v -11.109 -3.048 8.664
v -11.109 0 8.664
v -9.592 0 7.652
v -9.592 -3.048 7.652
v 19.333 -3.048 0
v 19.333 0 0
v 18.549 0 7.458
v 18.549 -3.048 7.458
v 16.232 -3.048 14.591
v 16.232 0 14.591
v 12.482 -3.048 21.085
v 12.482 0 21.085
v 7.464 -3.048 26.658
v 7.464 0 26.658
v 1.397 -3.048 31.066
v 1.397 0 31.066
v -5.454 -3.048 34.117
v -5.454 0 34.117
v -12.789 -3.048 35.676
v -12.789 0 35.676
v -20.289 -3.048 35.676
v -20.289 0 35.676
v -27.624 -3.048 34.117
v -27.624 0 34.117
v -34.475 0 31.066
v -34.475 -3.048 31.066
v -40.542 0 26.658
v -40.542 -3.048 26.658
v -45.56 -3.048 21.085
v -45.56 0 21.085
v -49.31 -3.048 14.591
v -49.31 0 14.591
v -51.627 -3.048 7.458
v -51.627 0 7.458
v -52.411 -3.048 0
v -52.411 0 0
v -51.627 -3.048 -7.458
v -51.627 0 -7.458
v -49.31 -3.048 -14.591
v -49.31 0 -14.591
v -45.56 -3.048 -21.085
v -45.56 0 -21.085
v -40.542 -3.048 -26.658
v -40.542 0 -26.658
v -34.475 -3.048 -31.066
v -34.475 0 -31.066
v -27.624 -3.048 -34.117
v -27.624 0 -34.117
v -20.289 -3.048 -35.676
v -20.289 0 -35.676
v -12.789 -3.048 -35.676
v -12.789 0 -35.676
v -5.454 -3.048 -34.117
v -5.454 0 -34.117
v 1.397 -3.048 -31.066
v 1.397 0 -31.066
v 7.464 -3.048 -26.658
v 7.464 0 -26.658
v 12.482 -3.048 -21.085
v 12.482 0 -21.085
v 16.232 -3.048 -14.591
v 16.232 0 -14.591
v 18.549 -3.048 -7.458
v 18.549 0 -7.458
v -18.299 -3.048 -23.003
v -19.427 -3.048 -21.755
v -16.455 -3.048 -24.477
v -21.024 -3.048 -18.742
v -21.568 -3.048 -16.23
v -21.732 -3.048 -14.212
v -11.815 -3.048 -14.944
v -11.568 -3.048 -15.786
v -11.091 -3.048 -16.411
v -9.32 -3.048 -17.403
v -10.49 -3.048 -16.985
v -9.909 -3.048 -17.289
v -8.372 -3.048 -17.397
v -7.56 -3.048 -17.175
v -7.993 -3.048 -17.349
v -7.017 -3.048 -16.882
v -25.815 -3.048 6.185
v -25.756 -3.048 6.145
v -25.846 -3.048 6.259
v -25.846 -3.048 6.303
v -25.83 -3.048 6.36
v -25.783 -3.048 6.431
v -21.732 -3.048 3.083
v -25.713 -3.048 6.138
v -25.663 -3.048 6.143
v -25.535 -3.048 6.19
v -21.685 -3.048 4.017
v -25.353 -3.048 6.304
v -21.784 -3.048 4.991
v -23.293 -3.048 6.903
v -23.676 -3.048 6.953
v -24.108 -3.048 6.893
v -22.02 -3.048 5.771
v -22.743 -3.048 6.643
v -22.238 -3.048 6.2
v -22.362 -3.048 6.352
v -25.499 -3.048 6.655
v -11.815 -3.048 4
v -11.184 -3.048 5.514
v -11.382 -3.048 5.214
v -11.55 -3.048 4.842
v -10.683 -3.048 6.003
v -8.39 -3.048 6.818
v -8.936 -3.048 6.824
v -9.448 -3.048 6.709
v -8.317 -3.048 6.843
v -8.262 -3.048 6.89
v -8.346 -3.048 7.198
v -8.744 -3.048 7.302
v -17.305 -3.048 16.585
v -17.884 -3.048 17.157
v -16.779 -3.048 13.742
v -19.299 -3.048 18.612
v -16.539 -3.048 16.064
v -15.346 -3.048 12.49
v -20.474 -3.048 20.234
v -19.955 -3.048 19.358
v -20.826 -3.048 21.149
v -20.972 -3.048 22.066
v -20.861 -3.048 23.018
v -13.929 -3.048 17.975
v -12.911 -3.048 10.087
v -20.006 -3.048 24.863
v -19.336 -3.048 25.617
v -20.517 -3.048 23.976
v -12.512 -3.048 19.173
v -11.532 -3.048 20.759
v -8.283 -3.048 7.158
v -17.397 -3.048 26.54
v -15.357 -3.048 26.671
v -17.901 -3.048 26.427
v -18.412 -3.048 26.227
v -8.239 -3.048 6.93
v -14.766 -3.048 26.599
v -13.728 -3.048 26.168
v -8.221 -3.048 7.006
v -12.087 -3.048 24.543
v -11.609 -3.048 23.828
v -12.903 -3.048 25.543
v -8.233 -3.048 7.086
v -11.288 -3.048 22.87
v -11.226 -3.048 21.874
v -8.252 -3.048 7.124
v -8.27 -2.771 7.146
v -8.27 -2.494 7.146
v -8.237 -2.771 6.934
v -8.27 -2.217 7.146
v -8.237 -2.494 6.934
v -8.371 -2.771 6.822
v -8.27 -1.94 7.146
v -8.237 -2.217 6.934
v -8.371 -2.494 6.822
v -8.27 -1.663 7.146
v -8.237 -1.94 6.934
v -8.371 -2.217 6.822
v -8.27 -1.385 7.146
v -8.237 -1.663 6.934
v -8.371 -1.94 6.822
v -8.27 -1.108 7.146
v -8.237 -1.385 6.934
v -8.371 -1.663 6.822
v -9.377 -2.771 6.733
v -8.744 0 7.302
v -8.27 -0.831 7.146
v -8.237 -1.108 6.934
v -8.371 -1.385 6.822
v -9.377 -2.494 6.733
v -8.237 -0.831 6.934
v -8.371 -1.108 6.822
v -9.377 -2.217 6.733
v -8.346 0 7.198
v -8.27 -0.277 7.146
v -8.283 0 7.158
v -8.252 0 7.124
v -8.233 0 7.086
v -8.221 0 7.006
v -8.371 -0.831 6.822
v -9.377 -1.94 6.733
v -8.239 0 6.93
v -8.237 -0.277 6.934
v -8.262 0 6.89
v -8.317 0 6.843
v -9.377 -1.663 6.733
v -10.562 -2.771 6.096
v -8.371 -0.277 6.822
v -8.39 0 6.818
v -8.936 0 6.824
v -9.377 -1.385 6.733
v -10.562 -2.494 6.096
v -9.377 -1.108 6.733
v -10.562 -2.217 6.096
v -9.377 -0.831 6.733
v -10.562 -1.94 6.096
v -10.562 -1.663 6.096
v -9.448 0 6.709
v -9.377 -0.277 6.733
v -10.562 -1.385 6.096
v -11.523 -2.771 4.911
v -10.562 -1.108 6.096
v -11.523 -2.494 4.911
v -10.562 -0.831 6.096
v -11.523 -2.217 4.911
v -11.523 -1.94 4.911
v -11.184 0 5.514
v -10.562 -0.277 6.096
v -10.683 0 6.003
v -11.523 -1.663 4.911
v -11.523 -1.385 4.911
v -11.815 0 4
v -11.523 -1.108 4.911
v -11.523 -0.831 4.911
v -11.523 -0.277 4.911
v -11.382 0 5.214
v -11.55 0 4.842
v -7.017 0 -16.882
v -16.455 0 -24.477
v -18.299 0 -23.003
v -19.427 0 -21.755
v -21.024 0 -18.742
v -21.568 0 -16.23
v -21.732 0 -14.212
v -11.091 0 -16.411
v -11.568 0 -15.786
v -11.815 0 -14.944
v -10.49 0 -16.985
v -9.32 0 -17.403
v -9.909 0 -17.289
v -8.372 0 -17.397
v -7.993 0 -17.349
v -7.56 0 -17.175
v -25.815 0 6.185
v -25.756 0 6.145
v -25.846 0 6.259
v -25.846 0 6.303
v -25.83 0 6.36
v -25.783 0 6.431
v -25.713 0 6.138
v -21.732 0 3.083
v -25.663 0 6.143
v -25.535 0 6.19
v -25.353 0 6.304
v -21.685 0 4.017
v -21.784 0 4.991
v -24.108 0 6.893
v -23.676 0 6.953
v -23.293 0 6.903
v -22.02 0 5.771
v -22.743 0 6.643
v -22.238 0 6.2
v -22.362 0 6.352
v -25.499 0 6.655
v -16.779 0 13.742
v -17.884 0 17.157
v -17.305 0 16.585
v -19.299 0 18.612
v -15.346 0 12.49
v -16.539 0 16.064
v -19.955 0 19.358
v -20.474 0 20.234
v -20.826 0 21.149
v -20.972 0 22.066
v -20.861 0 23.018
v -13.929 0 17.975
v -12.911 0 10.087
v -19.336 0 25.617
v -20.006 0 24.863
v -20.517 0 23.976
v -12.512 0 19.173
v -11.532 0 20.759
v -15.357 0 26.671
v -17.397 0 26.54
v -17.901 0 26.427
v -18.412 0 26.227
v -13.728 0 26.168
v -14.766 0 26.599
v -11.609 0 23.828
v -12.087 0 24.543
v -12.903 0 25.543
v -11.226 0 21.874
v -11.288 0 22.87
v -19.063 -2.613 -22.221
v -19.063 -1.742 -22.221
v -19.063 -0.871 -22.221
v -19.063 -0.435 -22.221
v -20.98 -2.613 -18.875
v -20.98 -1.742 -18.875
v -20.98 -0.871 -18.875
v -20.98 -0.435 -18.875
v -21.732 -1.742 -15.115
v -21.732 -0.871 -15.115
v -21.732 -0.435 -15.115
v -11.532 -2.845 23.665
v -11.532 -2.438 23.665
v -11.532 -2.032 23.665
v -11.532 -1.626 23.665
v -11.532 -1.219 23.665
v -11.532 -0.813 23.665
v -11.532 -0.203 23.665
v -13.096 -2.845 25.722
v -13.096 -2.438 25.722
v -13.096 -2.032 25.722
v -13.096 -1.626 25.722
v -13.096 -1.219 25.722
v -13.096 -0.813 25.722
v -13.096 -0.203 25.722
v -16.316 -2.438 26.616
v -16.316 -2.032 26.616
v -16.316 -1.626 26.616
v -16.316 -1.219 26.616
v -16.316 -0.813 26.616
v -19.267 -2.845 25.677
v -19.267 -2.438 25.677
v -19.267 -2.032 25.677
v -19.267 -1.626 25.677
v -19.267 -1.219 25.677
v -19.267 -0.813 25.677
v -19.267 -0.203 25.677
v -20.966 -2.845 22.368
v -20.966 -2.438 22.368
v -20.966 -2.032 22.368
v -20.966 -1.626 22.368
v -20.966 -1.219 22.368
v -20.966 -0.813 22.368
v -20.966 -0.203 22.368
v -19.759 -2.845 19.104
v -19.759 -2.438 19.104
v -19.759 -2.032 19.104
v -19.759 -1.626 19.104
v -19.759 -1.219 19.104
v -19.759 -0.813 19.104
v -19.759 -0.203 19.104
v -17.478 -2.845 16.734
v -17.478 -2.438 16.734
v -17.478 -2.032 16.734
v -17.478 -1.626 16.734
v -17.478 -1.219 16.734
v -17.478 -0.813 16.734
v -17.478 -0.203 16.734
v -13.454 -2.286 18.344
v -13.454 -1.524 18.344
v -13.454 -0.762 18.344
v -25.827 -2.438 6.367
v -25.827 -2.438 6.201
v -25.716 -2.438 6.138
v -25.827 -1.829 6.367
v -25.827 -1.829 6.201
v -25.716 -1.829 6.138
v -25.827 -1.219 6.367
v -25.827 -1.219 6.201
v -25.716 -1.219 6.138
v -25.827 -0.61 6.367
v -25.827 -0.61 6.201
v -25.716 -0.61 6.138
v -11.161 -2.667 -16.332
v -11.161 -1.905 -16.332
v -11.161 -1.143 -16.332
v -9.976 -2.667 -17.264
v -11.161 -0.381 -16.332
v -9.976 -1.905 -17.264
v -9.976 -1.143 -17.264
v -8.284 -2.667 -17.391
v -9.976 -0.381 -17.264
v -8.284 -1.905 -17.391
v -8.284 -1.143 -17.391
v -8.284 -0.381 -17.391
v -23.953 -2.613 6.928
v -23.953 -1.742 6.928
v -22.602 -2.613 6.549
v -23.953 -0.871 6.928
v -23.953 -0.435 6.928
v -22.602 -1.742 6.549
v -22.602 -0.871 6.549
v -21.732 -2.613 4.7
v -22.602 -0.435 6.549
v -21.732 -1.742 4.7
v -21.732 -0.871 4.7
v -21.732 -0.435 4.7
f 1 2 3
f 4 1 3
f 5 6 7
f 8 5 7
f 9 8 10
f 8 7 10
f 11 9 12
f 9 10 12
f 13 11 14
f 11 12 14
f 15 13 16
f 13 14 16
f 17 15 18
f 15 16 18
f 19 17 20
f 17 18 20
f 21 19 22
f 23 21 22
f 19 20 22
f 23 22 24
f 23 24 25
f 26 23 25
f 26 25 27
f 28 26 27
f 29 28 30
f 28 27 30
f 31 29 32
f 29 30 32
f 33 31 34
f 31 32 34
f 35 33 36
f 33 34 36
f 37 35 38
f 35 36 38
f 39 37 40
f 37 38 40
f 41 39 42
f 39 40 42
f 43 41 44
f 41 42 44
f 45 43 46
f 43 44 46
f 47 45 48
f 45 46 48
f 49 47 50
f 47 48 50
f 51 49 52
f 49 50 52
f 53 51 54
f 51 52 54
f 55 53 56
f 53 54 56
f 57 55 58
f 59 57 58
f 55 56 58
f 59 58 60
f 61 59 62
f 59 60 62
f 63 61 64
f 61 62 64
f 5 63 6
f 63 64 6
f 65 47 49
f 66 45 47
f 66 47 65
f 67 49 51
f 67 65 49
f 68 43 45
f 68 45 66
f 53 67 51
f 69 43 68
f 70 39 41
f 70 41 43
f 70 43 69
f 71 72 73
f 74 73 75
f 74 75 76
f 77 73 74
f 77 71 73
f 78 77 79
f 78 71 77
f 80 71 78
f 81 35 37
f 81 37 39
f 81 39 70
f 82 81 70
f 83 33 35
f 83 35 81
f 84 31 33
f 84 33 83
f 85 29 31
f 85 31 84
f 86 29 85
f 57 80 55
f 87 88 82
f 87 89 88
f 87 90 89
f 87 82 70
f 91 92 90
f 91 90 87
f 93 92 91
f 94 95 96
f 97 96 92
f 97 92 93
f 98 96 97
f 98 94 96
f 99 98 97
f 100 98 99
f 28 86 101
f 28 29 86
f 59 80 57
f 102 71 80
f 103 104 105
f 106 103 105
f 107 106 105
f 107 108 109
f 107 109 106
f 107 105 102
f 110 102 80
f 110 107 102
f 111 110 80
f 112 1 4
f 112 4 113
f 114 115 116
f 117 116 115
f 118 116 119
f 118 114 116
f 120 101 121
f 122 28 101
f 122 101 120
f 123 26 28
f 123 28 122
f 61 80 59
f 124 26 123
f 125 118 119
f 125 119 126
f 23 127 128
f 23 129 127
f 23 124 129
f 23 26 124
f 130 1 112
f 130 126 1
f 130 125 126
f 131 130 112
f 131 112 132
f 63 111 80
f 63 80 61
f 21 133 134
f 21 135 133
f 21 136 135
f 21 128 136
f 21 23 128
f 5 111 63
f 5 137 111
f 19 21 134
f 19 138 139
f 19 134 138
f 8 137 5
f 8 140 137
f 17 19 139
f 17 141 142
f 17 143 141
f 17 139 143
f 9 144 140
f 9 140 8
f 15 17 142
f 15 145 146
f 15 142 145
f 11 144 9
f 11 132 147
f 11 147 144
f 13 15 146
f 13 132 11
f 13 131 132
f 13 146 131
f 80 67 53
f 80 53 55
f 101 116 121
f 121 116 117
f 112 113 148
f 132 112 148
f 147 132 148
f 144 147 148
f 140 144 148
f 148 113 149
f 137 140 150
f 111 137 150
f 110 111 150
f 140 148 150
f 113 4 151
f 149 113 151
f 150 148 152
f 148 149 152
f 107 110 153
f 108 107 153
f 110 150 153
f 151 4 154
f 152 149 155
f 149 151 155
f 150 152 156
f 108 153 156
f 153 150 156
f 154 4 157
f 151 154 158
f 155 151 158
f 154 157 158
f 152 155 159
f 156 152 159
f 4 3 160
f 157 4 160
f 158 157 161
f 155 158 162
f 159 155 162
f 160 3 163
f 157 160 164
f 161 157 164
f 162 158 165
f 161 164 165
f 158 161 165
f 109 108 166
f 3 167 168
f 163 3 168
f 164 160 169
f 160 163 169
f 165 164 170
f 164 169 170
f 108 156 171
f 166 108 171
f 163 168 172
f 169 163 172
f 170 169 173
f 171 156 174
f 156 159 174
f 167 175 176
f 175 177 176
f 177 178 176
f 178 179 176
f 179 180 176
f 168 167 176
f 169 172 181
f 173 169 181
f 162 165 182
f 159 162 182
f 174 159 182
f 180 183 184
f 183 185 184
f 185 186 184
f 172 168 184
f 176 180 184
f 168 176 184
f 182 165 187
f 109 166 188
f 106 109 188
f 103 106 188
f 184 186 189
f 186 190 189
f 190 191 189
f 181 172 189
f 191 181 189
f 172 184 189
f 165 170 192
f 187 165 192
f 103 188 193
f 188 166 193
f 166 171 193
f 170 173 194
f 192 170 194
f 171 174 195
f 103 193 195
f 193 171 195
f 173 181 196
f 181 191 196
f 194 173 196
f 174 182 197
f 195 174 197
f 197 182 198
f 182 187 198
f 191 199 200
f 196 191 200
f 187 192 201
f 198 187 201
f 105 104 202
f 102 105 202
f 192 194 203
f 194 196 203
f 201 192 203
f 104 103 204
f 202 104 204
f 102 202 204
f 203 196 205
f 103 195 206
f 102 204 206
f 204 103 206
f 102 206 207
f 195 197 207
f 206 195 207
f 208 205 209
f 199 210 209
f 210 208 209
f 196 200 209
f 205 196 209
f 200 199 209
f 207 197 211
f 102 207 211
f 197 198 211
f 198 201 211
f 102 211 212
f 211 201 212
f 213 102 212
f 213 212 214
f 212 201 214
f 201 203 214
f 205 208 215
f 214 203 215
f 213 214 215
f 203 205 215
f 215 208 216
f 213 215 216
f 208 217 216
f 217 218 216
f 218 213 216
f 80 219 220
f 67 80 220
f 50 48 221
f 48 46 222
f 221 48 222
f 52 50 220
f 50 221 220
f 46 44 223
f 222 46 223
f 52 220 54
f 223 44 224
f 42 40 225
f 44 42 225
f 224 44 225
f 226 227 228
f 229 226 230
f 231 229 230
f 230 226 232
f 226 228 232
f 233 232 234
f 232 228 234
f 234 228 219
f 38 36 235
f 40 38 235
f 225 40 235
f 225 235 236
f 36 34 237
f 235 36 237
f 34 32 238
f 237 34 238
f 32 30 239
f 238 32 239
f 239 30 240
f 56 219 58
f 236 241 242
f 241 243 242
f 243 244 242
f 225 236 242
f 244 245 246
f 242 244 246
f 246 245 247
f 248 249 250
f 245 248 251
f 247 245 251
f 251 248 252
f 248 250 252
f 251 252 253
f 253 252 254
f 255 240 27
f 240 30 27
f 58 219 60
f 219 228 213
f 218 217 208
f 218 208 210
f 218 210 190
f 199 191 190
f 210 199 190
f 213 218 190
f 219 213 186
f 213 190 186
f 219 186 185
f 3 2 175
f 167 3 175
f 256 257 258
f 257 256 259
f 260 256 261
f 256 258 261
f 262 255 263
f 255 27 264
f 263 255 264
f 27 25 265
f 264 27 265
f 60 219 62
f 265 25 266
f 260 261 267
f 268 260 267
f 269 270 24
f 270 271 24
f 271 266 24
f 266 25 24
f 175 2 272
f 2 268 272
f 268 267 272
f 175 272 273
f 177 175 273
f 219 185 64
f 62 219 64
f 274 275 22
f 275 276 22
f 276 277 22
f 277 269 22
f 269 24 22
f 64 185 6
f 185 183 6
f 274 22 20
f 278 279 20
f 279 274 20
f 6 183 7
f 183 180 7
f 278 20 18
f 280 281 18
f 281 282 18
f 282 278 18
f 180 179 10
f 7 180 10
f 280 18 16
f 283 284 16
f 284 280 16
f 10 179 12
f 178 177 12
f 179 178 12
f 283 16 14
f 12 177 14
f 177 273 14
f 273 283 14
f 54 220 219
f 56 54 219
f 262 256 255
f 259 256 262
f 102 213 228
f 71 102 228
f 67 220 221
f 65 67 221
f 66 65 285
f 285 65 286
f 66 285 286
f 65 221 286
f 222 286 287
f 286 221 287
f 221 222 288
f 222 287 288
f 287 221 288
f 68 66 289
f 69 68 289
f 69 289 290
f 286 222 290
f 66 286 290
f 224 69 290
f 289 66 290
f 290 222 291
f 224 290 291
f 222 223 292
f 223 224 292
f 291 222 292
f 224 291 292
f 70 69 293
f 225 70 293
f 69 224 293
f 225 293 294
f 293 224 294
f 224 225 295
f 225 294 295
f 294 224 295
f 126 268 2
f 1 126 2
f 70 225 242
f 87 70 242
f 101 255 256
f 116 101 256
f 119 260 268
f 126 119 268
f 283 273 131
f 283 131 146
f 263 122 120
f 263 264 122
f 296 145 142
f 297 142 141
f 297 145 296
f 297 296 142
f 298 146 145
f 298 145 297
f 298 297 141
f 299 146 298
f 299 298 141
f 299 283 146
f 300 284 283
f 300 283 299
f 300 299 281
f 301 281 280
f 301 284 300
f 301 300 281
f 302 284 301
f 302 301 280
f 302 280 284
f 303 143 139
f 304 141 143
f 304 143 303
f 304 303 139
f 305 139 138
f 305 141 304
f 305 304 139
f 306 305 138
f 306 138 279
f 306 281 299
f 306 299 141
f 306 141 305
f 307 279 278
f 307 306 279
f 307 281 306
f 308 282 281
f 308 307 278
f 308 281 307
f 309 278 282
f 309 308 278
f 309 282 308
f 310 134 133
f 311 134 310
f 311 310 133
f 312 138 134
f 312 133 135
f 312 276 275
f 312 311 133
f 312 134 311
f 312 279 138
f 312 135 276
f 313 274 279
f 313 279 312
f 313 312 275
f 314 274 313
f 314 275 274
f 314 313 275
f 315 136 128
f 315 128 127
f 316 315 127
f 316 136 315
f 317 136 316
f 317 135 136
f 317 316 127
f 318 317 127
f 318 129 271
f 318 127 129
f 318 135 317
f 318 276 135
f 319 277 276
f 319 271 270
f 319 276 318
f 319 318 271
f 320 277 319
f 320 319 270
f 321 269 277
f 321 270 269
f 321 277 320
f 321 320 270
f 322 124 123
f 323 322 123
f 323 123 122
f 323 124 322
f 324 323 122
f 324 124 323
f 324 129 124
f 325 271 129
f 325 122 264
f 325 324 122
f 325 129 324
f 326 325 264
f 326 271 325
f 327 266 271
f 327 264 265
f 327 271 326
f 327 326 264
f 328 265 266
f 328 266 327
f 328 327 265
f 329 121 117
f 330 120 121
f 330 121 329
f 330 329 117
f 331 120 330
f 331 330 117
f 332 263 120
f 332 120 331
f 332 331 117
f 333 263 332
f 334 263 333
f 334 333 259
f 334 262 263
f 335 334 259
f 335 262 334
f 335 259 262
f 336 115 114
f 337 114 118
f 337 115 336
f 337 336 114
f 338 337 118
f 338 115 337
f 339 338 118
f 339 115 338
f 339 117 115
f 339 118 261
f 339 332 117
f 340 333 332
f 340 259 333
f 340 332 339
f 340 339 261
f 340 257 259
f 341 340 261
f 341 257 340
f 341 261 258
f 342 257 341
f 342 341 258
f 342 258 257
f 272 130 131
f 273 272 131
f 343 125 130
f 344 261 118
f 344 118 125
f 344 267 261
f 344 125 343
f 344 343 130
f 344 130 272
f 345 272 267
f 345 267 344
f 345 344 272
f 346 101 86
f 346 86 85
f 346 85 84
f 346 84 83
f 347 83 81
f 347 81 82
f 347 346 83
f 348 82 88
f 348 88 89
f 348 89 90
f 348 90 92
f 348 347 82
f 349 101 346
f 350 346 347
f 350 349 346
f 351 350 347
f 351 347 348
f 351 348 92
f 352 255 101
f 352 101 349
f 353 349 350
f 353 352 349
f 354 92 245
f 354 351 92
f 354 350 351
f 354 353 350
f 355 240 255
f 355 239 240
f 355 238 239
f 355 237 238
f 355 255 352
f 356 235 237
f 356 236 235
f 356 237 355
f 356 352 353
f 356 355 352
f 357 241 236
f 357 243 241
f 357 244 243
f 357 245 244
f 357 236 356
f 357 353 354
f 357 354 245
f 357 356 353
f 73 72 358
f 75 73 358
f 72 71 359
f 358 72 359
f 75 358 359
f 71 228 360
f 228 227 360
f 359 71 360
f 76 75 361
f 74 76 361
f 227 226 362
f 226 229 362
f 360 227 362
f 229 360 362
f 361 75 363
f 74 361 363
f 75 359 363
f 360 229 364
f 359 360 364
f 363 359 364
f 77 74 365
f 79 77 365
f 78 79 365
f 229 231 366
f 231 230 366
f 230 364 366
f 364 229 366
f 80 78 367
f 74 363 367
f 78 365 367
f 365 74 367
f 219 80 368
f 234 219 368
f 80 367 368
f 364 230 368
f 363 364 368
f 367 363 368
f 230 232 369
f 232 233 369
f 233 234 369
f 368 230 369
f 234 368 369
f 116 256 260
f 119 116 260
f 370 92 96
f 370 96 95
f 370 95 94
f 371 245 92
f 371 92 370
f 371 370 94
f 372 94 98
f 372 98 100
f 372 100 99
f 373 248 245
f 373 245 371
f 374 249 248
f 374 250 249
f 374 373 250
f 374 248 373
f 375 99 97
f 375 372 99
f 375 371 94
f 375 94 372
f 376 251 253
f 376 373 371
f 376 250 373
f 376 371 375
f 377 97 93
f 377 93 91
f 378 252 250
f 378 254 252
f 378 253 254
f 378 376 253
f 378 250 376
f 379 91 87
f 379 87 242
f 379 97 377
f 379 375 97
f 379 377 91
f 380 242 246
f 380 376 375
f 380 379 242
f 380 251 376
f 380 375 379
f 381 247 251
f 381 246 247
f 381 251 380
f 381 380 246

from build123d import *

# Parameters (mm, degrees)
F0_R     = 35.8722677543
F1_DEPTH = 3.048


with BuildPart() as f1:
    # F0 (on Front) → F1 (new body)
    with BuildSketch(Plane.XZ):
        with Locations((-16.5389925241, 0)):
            Circle(F0_R)
        with BuildLine():
            Line((-7.0172841661, -16.8818086386), (-16.4545532316, -24.4767442346))
            add(Edge.make_bspline(
                [(-16.4545532316, -24.4767442346), (-16.8368068171, -24.1939949846), (-17.6591396418, -23.5857234125), (-19.1498410611, -22.2695343414), (-20.1683555608, -20.6216308858), (-21.0775722167, -18.8965393574), (-21.4159472056, -17.0038620995), (-21.7830891286, -15.1529140615), (-21.7468870372, -14.4858724729), (-21.7320397496, -14.2123037949)],
                knots=[0, 0, 0, 0, 0.1335803654, 0.2873681853, 0.4404495382, 0.5922340471, 0.7460919747, 0.8958666386, 1, 1, 1, 1], degree=3))
            Line((-21.7320397496, -14.2123037949), (-21.7320397496, 3.0830921605))
            add(Edge.make_bspline(
                [(-25.3525003791, 6.3037872314), (-25.0035694122, 6.4840549077), (-24.4211323439, 6.784958487), (-23.9671240009, 6.9548534074), (-23.2729776472, 6.9757200424), (-22.5775088209, 6.5504818074), (-22.1244270369, 6.173485954), (-21.610740531, 4.6481096322), (-21.6911569949, 3.6105665011), (-21.7320397496, 3.0830921605)],
                knots=[0, 0, 0, 0, 0.1543245572, 0.2575992135, 0.3790212722, 0.5114796991, 0.6251869619, 0.8094495986, 1, 1, 1, 1], degree=3))
            add(Edge.make_bspline(
                [(-25.499086827, 6.6551566124), (-25.6385246281, 6.5602763851), (-25.8639647367, 6.4068760261), (-25.8485920944, 6.1900064814), (-25.7133319129, 6.107920989), (-25.4915746658, 6.2047990872), (-25.3967399547, 6.2722990707), (-25.3525003791, 6.3037872314)],
                knots=[0, 0, 0, 0, 0.2846359539, 0.4601934329, 0.6140274626, 0.8199471371, 1, 1, 1, 1], degree=3))
            Line((-25.499086827, 6.6551566124), (-16.7787857354, 13.7423193082))
            Line((-16.7787857354, 13.7423193082), (-15.3459142894, 12.4895032495))
            Line((-15.3459142894, 12.4895032495), (-12.911436148, 10.0866425782))
            Line((-12.911436148, 10.0866425782), (-11.1092906445, 8.6638955399))
            Line((-11.1092906445, 8.6638955399), (-9.5916930586, 7.6521639712))
            add(Edge.make_bspline(
                [(-9.5916930586, 7.6521639712), (-9.349729434, 7.5241534863), (-8.901127436, 7.2868212866), (-8.2178516893, 7.2340472433), (-8.2081308902, 6.9188765434), (-8.3758976081, 6.7811977964), (-8.7490682058, 6.8679608418), (-9.3993086232, 6.7593583892), (-9.9663047763, 6.4823224185), (-10.5756488537, 6.11491138), (-11.205548345, 5.5589280964), (-11.5528638282, 4.9166655347), (-11.7238497245, 4.3198587863), (-11.8153616786, 4.0004467592)],
                knots=[0, 0, 0, 0, 0.1084812333, 0.2011248513, 0.256700979, 0.3067833697, 0.3784833865, 0.4755646116, 0.5711165511, 0.6723420327, 0.7810491113, 0.8828170972, 1, 1, 1, 1], degree=3))
            Line((-11.8153616786, 4.0004467592), (-11.8153616786, 0))
            Line((-11.8153616786, 0), (-11.8153616786, -9.1262217611))
            Line((-11.8153616786, -9.1262217611), (-11.8153616786, -14.9436760694))
            add(Edge.make_bspline(
                [(-11.8153616786, -14.9436760694), (-11.752930028, -15.2417605806), (-11.6349053575, -15.8052780581), (-11.1592093747, -16.3296727482), (-10.6540369389, -16.9123160957), (-9.9771466257, -17.3074550788), (-9.2864785852, -17.4372864271), (-8.2735107194, -17.4033083883), (-7.8177957528, -17.3297418503), (-7.3118112692, -17.0466138374), (-7.0172841661, -16.8818086386)],
                knots=[0, 0, 0, 0, 0.1334555489, 0.25229266, 0.3778349348, 0.5020083005, 0.6239272043, 0.7656469646, 0.8635860924, 1, 1, 1, 1], degree=3))
        make_face(mode=Mode.SUBTRACT)
        with BuildLine():
            add(Edge.make_bspline(
                [(-16.5393147618, 16.0637069494), (-16.0952406112, 16.3723268092), (-15.1531884741, 17.0270282778), (-13.4519795924, 18.3410565916), (-12.307992004, 19.2477362645), (-11.7960339961, 20.2438380114), (-11.5315010771, 20.7585319877)],
                knots=[0, 0, 0, 0, 0.2477515115, 0.5255762818, 0.7548613575, 1, 1, 1, 1], degree=3))
            add(Edge.make_bspline(
                [(-11.5315010771, 20.7585319877), (-11.3886353445, 21.131794299), (-11.0776192325, 21.9443795897), (-11.422463862, 23.7306869337), (-12.2198755022, 24.6869108683), (-13.0056152853, 25.8167281527), (-14.8153986013, 26.8110341086), (-16.3083312279, 26.5741886558), (-17.7349189872, 26.6068206692), (-19.3878002125, 25.774154561), (-20.5117985183, 24.2148361341), (-21.1179317123, 22.375294743), (-20.7808520416, 20.7288316555), (-19.8509306492, 19.0194517847), (-18.4767807189, 17.9221470779), (-17.54650896, 16.6853845369), (-16.8593317149, 16.2612332732), (-16.5393147618, 16.0637069494)],
                knots=[0, 0, 0, 0, 0.0591766629, 0.1288265232, 0.1875414136, 0.2494013304, 0.3235814023, 0.3879482515, 0.4504797153, 0.5207736845, 0.5940792329, 0.6664881359, 0.7341792345, 0.8072636763, 0.8777722528, 0.9430788032, 1, 1, 1, 1], degree=3))
        make_face(mode=Mode.SUBTRACT)
    extrude(amount=F1_DEPTH)


solid = f1.part
